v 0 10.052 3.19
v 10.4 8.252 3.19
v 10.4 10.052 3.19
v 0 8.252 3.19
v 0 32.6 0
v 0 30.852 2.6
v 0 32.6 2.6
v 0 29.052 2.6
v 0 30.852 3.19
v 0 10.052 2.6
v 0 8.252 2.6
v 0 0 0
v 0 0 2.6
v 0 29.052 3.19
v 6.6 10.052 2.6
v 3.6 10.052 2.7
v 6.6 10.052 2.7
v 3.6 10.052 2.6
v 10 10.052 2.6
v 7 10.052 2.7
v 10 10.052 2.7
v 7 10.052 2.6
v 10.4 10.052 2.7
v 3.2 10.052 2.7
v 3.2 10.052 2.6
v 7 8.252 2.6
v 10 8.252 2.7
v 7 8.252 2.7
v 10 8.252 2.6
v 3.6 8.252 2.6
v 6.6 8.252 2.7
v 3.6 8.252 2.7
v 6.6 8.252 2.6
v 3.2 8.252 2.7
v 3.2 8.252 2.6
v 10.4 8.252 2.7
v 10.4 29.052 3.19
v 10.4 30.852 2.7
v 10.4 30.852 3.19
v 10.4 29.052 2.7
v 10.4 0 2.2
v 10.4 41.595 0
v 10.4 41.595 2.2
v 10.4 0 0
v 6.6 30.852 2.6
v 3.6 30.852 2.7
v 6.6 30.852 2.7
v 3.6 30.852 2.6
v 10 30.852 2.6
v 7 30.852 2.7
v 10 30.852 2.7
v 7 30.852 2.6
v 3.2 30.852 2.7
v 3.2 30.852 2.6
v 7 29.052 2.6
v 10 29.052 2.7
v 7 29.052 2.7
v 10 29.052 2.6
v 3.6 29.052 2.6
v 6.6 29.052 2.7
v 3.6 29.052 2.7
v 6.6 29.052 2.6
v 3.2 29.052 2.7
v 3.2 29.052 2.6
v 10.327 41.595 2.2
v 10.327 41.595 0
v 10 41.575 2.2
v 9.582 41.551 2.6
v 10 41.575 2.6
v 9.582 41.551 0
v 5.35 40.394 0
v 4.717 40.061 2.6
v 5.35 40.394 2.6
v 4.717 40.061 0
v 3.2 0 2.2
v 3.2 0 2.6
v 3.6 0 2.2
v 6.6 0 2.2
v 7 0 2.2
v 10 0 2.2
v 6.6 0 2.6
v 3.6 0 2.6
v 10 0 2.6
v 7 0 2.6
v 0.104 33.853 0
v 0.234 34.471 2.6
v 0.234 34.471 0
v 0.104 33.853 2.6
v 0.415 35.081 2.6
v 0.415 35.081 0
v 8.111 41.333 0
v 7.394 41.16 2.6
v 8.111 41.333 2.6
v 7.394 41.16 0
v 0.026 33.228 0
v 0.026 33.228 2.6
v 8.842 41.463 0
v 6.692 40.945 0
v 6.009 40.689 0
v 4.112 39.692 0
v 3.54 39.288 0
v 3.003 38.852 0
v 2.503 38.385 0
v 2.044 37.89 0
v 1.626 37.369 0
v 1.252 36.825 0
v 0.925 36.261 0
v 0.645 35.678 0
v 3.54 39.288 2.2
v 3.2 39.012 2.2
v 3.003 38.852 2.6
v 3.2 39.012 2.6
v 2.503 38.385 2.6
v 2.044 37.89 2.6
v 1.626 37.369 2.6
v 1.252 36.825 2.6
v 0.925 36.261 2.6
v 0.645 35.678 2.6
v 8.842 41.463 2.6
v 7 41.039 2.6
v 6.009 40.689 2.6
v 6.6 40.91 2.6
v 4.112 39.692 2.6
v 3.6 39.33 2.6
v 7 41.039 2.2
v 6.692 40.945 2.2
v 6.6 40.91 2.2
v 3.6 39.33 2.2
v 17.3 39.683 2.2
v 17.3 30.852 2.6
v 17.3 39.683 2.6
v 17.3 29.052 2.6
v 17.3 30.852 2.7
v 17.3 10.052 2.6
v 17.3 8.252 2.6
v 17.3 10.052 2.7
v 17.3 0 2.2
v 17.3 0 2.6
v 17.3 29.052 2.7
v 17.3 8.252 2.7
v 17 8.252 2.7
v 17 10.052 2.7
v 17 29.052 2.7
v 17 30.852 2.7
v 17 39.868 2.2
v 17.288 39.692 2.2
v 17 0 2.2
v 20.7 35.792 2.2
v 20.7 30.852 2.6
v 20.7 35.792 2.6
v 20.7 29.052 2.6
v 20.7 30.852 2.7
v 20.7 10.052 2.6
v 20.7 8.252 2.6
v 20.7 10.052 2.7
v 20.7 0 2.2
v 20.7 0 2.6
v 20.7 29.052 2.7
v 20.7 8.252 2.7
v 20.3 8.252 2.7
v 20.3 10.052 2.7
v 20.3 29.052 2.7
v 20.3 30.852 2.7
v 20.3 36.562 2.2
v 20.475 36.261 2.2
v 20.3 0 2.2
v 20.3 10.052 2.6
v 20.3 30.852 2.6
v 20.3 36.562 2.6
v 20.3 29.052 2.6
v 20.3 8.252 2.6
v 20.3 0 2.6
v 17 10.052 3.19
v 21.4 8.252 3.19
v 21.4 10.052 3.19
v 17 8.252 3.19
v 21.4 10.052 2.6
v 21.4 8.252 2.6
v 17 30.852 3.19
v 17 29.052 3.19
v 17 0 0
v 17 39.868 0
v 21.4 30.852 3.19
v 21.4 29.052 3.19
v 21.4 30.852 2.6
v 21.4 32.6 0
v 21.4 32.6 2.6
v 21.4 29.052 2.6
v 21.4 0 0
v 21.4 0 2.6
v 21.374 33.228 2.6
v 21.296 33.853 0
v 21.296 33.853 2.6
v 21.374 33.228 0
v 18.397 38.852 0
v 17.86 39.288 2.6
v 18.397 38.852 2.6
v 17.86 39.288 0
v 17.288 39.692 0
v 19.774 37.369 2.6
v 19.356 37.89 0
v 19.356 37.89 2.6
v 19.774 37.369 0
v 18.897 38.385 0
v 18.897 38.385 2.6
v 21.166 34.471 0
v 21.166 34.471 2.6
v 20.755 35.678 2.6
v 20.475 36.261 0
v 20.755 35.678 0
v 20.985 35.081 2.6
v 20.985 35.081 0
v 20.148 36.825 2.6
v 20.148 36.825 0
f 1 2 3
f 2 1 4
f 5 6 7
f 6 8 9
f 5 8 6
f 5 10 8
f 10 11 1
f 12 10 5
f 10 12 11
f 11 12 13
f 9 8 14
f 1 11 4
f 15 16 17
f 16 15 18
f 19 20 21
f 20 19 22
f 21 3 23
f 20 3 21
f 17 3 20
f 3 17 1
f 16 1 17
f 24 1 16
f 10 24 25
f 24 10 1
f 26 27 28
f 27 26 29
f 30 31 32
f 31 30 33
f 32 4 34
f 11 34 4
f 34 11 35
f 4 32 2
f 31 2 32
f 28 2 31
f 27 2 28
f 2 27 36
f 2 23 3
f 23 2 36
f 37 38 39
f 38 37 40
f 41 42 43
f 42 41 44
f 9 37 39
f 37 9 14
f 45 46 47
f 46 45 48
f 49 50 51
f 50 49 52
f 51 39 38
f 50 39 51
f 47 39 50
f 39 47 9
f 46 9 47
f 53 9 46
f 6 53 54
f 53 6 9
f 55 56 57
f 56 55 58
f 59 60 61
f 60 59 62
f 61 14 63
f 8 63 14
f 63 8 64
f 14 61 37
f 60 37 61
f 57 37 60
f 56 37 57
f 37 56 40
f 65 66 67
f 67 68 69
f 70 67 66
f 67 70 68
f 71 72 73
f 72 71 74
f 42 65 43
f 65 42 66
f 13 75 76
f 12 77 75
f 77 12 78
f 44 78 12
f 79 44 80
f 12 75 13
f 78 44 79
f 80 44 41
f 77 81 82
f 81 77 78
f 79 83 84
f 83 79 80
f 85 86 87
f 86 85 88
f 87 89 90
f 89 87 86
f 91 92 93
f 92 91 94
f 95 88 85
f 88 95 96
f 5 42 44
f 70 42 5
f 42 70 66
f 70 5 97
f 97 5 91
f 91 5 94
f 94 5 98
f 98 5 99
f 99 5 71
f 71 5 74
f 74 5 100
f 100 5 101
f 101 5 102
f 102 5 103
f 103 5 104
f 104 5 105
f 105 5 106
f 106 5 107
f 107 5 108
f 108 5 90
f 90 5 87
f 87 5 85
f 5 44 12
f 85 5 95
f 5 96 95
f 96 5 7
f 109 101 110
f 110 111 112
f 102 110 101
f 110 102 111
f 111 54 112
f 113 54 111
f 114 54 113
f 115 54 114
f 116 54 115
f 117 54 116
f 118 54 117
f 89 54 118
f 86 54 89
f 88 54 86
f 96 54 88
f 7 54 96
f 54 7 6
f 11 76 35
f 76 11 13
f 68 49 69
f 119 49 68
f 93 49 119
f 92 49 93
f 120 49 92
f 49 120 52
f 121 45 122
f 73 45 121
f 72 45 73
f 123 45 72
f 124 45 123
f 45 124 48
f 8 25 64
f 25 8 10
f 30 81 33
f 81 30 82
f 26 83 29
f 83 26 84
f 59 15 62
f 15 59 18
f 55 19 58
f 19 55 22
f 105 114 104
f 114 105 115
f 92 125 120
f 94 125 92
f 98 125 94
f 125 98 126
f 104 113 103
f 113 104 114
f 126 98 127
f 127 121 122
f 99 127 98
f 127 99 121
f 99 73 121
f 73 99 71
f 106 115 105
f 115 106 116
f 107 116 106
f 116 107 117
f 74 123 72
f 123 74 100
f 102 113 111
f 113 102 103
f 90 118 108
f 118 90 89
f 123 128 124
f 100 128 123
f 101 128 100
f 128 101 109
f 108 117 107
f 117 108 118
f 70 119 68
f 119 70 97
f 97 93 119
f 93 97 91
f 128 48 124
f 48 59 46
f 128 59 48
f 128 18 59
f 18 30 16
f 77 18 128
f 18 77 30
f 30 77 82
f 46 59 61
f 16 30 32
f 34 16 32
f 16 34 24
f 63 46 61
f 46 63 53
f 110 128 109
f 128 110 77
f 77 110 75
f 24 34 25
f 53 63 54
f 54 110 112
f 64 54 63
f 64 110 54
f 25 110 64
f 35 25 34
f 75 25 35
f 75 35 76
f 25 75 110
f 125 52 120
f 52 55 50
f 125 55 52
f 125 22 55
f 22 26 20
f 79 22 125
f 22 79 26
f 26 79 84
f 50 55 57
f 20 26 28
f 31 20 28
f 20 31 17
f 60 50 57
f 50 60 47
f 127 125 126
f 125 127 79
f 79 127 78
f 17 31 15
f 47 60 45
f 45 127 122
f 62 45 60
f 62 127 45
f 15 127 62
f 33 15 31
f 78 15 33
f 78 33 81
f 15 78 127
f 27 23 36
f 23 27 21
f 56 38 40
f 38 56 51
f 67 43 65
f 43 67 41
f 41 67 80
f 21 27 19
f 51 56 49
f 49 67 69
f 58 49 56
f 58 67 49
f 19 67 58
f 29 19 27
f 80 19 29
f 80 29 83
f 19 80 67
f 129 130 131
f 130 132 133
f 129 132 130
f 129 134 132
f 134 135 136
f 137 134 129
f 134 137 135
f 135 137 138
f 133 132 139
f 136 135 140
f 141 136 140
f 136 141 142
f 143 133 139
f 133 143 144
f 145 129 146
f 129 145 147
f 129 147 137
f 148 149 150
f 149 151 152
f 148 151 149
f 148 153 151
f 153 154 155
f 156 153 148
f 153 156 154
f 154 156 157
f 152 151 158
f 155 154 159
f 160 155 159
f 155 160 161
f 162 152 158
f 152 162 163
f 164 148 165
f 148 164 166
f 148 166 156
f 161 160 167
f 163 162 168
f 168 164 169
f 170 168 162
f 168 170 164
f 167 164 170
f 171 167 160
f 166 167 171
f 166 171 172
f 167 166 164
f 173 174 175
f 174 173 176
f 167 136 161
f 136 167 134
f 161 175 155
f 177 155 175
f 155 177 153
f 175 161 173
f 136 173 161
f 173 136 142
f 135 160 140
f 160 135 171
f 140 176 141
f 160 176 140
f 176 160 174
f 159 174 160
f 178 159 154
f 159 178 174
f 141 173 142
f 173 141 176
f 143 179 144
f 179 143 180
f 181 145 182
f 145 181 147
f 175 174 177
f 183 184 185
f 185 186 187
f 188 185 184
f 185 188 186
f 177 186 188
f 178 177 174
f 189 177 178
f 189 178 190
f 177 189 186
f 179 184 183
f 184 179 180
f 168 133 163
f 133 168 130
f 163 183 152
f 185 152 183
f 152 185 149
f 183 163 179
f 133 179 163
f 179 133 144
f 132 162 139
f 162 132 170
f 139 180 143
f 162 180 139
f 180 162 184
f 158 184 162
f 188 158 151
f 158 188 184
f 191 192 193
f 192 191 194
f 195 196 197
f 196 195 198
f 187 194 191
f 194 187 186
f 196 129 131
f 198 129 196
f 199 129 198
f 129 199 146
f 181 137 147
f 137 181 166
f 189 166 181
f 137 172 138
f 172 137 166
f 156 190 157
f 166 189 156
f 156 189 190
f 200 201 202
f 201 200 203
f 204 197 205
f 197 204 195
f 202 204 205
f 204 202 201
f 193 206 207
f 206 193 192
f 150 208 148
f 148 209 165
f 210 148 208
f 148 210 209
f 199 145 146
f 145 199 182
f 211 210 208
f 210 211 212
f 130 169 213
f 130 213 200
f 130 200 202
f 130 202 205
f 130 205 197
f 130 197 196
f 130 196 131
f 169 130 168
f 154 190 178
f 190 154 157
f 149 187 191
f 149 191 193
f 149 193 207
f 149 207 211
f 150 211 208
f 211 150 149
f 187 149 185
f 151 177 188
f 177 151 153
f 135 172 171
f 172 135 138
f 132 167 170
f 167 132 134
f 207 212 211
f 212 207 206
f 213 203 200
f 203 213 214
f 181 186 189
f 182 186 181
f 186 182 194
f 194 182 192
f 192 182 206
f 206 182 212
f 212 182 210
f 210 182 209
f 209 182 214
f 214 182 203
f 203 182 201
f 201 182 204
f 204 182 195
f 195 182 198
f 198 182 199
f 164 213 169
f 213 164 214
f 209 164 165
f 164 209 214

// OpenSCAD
// file: ../lib/gatehouse.scad
// gatehouse.scad — gate doors, securing beam, drawbridge, and door
// props sized to the wall openings. Requires grid.scad,
// connectors.scad, and pieces.scad (for DOOR_*/GATE_* dimensions).
// All pieces print flat, support-free.

GATE_PIECE = "gate_doors";

// Vertical plank grooves cut down from a panel top surface at z = 0.
module gh_planks(w, l, pitch = 3.4) {
    for (x = [scaled(pitch) : scaled(pitch) : w - 1])
        translate([x - 0.2, -EPS, -0.4]) cube([0.4, l + 2 * EPS, 0.5]);
}

// One door panel: 2D outline profile passed as a child, planked with
// raised straps and a handle boss. Lies flat, outline in XY.
module door_panel(w, h) {
    difference() {
        union() {
            linear_extrude(height = scaled(2.6)) children();
            for (z = [h * 0.22, h * 0.72])
                translate([0, z - scaled(0.9), scaled(2.6) - EPS])
                    intersection() {
                        cube([w, scaled(1.8), 0.6]);
                        translate([0, -z + scaled(0.9), -scaled(2.6)])
                            linear_extrude(height = scaled(4))
                                children();
                    }
        }
        translate([0, 0, scaled(2.6)]) gh_planks(w, h);
    }
}

// Loose door prop for standard doorway openings ("arch" or "rect").
module door_prop(style = "arch") {
    w = scaled(DOOR_W) - 0.6;
    h = scaled(DOOR_H) - 0.4;
    translate([w / 2, 0, 0]) door_panel(w, h)
        if (style == "arch")
            profile_arch(w, h, scaled(ARCH_RISE));
        else
            profile_rect(w, h);
    // handle boss
    translate([w * 0.82, h * 0.5, scaled(2.6)])
        cylinder(h = 0.9, d = scaled(2));
}

// Double gate doors: the gate arch split into two leaves with a
// center gap, printed side by side.
module gate_doors() {
    w = scaled(GATE_W) - 0.6;
    h = scaled(GATE_H) - 0.4;
    for (side = [0, 1])
        translate([side * (w / 2 + scaled(3)), 0, 0])
            door_panel(w, h)
                intersection() {
                    translate([w / 2 - side * (w / 2 + scaled(3)), 0])
                        profile_arch(w, h, scaled(GATE_RISE));
                    translate([side == 0 ? 0 : scaled(3) + 0.3, 0])
                        square([w / 2 - 0.3, h]);
                }
}

// Securing beam: drops into the gate_wall brackets behind the doors.
module gate_beam() {
    bs = scaled(GATE_BEAM_SQ);
    len = scaled(GATE_W) + 2 * scaled(4) + scaled(10);
    cube([len, bs, bs]);
    for (x = [0, len - scaled(1.2)])
        translate([x, -scaled(0.5), 0])
            cube([scaled(1.2), bs + scaled(1), bs]);
}

// Drawbridge: planked deck, 45-degree approach chamfer at the free
// end, rope holes at the pivot end. Prints flat.
module drawbridge() {
    w = grid(2) - scaled(6);
    l = grid(2);
    t = scaled(3);
    difference() {
        union() {
            cube([w, l - scaled(3), t]);
            translate([0, l - scaled(3), 0])
                hull() {
                    cube([w, EPS, t]);
                    translate([0, scaled(3) - EPS, 0]) cube([w, EPS, t / 2]);
                }
            // side rub rails
            for (x = [0, w - scaled(2)])
                translate([x, 0, t - EPS])
                    cube([scaled(2), l - scaled(4), scaled(1.2)]);
        }
        translate([0, 0, t]) gh_planks(w, l, 4.2);
        for (x = [scaled(4), w - scaled(4)])
            translate([x, scaled(4), -EPS])
                cylinder(h = t + scaled(1.2) + 2 * EPS, d = scaled(2.6));
    }
}

module gate_piece(kind = GATE_PIECE) {
    if (kind == "gate_doors") gate_doors();
    if (kind == "gate_beam")  gate_beam();
    if (kind == "drawbridge") drawbridge();
    if (kind == "door_arch")  door_prop("arch");
    if (kind == "door_rect")  door_prop("rect");
}
// file: ../lib/connectors.scad
// connectors.scad — shared connector geometry.
// Requires grid.scad to be included first.
//
// Convention: a connector lives on an edge face lying in the YZ plane
// at x = 0, centered on y = 0, with the piece's material on the -X
// side for male parts and the +X side for female parts. Pieces
// translate/rotate these modules into position.
//
// All fit-critical dimensions here are ABSOLUTE (see grid.scad).

// Connector type used by all pieces: "tab" | "magnet" | "dowel" | "none".
// Tab & slot is gendered (a piece has male and female edges); magnet,
// dowel, and none are genderless, so tiles can be rotated freely.
CONNECTOR = "tab";

// Tab & slot (puzzle-style dovetail, full piece thickness). Defaults
// suit flat tiles; walls pass smaller dims that fit inside their
// thickness (see pieces.scad).
TAB_NECK  = 6;    // width at the edge face
TAB_HEAD  = 10;   // width at the tip
TAB_DEPTH = 6;    // how far the tab projects

// Dowel pin (1.75mm filament offcuts make free pins).
DOWEL_D     = 1.85;
DOWEL_DEPTH = 6;

// Magnet pocket. Named size "DxH" in mm.
MAGNET = "5x2";
function magnet_d(m = MAGNET) =
    m == "3x2" ? 3 : m == "6x2" ? 6 : m == "8x3" ? 8 : 5;
function magnet_h(m = MAGNET) =
    m == "8x3" ? 3 : 2;

// Dovetail profile, projecting toward +X. grow > 0 loosens the female.
module tab_profile(grow = 0, neck = TAB_NECK, head = TAB_HEAD,
                   depth = TAB_DEPTH) {
    polygon([
        [-EPS,         -(neck / 2 + grow)],
        [depth + grow, -(head / 2 + grow)],
        [depth + grow,   head / 2 + grow],
        [-EPS,           neck / 2 + grow]
    ]);
}

// Male tab: union onto a piece whose edge face is at x = 0, material
// on -X. The tab projects +X into the neighboring piece's slot.
module tab_male(thickness, neck = TAB_NECK, head = TAB_HEAD,
                depth = TAB_DEPTH) {
    linear_extrude(height = thickness)
        tab_profile(0, neck, head, depth);
}

// Female slot: subtract from a piece whose edge face is at x = 0,
// material on +X. The cut extends +X into the material, opening at the
// edge face so the mating tab enters from -X.
module tab_female(thickness, clearance = fit_clearance(),
                  neck = TAB_NECK, head = TAB_HEAD, depth = TAB_DEPTH) {
    translate([0, 0, -EPS])
        linear_extrude(height = thickness + 2 * EPS)
            tab_profile(clearance, neck, head, depth);
}

// Cylindrical pocket bored into an edge face at x = 0, material on +X,
// axis along +X, centered at height z.
module edge_pocket(d, depth, z) {
    translate([-EPS, 0, z])
        rotate([0, 90, 0])
            cylinder(h = depth + EPS, d = d);
}

// Magnet pocket (female on both mating pieces). Slight extra depth so
// the magnet seats flush after glue.
module magnet_pocket(z, m = MAGNET, clearance = fit_clearance()) {
    edge_pocket(magnet_d(m) + clearance, magnet_h(m) + 0.1, z);
}

// Dowel hole (female on both mating pieces).
module dowel_hole(z, clearance = fit_clearance()) {
    edge_pocket(DOWEL_D + clearance, DOWEL_DEPTH, z);
}
// file: ../lib/grid.scad
// grid.scad — core grid, scale, and tolerance foundation.
// Every piece in the system includes this file.
//
// Two classes of dimension, never mixed:
//   scaled()  — aesthetic sizes; follow SCALE so kits can be resized.
//   absolute  — fit-critical sizes (clearances, magnet pockets, pin
//               holes); constant regardless of SCALE.

// One tabletop grid square. 25.4mm (1 inch) keeps pieces in register
// with battlemats and standard 2-inch tile systems. Change once to
// retarget the whole library (e.g. 32 for a 32mm module standard).
GRID_UNIT = 25.4;

// Aesthetic scale multiplier (1.0 = 28mm heroic terrain).
SCALE = 1.0;

// Default structural sizes (scaled, mm at SCALE = 1.0).
FLOOR_THICKNESS   = 4;
WALL_THICKNESS    = 6;
WALL_HEIGHT_UNITS = 2;   // wall height in grid units

// Fit preset: "tight" | "normal" | "loose". Absolute mm — never scaled.
FIT = "normal";

function fit_clearance(fit = FIT) =
    fit == "tight" ? 0.10 :
    fit == "loose" ? 0.25 :
                     0.15;

// Helpers.
function scaled(x) = x * SCALE;
function grid(n)   = n * GRID_UNIT * SCALE;

// Boolean-overlap epsilon for clean CSG.
EPS = 0.01;

// Curve quality.
$fa = 4;
$fs = 0.4;
// main file
// gate_props.scad — gate doors, beam, drawbridge, door props.
include <../lib/grid.scad>
include <../lib/connectors.scad>
include <../lib/pieces.scad>
include <../lib/gatehouse.scad>

gate_piece(GATE_PIECE);
